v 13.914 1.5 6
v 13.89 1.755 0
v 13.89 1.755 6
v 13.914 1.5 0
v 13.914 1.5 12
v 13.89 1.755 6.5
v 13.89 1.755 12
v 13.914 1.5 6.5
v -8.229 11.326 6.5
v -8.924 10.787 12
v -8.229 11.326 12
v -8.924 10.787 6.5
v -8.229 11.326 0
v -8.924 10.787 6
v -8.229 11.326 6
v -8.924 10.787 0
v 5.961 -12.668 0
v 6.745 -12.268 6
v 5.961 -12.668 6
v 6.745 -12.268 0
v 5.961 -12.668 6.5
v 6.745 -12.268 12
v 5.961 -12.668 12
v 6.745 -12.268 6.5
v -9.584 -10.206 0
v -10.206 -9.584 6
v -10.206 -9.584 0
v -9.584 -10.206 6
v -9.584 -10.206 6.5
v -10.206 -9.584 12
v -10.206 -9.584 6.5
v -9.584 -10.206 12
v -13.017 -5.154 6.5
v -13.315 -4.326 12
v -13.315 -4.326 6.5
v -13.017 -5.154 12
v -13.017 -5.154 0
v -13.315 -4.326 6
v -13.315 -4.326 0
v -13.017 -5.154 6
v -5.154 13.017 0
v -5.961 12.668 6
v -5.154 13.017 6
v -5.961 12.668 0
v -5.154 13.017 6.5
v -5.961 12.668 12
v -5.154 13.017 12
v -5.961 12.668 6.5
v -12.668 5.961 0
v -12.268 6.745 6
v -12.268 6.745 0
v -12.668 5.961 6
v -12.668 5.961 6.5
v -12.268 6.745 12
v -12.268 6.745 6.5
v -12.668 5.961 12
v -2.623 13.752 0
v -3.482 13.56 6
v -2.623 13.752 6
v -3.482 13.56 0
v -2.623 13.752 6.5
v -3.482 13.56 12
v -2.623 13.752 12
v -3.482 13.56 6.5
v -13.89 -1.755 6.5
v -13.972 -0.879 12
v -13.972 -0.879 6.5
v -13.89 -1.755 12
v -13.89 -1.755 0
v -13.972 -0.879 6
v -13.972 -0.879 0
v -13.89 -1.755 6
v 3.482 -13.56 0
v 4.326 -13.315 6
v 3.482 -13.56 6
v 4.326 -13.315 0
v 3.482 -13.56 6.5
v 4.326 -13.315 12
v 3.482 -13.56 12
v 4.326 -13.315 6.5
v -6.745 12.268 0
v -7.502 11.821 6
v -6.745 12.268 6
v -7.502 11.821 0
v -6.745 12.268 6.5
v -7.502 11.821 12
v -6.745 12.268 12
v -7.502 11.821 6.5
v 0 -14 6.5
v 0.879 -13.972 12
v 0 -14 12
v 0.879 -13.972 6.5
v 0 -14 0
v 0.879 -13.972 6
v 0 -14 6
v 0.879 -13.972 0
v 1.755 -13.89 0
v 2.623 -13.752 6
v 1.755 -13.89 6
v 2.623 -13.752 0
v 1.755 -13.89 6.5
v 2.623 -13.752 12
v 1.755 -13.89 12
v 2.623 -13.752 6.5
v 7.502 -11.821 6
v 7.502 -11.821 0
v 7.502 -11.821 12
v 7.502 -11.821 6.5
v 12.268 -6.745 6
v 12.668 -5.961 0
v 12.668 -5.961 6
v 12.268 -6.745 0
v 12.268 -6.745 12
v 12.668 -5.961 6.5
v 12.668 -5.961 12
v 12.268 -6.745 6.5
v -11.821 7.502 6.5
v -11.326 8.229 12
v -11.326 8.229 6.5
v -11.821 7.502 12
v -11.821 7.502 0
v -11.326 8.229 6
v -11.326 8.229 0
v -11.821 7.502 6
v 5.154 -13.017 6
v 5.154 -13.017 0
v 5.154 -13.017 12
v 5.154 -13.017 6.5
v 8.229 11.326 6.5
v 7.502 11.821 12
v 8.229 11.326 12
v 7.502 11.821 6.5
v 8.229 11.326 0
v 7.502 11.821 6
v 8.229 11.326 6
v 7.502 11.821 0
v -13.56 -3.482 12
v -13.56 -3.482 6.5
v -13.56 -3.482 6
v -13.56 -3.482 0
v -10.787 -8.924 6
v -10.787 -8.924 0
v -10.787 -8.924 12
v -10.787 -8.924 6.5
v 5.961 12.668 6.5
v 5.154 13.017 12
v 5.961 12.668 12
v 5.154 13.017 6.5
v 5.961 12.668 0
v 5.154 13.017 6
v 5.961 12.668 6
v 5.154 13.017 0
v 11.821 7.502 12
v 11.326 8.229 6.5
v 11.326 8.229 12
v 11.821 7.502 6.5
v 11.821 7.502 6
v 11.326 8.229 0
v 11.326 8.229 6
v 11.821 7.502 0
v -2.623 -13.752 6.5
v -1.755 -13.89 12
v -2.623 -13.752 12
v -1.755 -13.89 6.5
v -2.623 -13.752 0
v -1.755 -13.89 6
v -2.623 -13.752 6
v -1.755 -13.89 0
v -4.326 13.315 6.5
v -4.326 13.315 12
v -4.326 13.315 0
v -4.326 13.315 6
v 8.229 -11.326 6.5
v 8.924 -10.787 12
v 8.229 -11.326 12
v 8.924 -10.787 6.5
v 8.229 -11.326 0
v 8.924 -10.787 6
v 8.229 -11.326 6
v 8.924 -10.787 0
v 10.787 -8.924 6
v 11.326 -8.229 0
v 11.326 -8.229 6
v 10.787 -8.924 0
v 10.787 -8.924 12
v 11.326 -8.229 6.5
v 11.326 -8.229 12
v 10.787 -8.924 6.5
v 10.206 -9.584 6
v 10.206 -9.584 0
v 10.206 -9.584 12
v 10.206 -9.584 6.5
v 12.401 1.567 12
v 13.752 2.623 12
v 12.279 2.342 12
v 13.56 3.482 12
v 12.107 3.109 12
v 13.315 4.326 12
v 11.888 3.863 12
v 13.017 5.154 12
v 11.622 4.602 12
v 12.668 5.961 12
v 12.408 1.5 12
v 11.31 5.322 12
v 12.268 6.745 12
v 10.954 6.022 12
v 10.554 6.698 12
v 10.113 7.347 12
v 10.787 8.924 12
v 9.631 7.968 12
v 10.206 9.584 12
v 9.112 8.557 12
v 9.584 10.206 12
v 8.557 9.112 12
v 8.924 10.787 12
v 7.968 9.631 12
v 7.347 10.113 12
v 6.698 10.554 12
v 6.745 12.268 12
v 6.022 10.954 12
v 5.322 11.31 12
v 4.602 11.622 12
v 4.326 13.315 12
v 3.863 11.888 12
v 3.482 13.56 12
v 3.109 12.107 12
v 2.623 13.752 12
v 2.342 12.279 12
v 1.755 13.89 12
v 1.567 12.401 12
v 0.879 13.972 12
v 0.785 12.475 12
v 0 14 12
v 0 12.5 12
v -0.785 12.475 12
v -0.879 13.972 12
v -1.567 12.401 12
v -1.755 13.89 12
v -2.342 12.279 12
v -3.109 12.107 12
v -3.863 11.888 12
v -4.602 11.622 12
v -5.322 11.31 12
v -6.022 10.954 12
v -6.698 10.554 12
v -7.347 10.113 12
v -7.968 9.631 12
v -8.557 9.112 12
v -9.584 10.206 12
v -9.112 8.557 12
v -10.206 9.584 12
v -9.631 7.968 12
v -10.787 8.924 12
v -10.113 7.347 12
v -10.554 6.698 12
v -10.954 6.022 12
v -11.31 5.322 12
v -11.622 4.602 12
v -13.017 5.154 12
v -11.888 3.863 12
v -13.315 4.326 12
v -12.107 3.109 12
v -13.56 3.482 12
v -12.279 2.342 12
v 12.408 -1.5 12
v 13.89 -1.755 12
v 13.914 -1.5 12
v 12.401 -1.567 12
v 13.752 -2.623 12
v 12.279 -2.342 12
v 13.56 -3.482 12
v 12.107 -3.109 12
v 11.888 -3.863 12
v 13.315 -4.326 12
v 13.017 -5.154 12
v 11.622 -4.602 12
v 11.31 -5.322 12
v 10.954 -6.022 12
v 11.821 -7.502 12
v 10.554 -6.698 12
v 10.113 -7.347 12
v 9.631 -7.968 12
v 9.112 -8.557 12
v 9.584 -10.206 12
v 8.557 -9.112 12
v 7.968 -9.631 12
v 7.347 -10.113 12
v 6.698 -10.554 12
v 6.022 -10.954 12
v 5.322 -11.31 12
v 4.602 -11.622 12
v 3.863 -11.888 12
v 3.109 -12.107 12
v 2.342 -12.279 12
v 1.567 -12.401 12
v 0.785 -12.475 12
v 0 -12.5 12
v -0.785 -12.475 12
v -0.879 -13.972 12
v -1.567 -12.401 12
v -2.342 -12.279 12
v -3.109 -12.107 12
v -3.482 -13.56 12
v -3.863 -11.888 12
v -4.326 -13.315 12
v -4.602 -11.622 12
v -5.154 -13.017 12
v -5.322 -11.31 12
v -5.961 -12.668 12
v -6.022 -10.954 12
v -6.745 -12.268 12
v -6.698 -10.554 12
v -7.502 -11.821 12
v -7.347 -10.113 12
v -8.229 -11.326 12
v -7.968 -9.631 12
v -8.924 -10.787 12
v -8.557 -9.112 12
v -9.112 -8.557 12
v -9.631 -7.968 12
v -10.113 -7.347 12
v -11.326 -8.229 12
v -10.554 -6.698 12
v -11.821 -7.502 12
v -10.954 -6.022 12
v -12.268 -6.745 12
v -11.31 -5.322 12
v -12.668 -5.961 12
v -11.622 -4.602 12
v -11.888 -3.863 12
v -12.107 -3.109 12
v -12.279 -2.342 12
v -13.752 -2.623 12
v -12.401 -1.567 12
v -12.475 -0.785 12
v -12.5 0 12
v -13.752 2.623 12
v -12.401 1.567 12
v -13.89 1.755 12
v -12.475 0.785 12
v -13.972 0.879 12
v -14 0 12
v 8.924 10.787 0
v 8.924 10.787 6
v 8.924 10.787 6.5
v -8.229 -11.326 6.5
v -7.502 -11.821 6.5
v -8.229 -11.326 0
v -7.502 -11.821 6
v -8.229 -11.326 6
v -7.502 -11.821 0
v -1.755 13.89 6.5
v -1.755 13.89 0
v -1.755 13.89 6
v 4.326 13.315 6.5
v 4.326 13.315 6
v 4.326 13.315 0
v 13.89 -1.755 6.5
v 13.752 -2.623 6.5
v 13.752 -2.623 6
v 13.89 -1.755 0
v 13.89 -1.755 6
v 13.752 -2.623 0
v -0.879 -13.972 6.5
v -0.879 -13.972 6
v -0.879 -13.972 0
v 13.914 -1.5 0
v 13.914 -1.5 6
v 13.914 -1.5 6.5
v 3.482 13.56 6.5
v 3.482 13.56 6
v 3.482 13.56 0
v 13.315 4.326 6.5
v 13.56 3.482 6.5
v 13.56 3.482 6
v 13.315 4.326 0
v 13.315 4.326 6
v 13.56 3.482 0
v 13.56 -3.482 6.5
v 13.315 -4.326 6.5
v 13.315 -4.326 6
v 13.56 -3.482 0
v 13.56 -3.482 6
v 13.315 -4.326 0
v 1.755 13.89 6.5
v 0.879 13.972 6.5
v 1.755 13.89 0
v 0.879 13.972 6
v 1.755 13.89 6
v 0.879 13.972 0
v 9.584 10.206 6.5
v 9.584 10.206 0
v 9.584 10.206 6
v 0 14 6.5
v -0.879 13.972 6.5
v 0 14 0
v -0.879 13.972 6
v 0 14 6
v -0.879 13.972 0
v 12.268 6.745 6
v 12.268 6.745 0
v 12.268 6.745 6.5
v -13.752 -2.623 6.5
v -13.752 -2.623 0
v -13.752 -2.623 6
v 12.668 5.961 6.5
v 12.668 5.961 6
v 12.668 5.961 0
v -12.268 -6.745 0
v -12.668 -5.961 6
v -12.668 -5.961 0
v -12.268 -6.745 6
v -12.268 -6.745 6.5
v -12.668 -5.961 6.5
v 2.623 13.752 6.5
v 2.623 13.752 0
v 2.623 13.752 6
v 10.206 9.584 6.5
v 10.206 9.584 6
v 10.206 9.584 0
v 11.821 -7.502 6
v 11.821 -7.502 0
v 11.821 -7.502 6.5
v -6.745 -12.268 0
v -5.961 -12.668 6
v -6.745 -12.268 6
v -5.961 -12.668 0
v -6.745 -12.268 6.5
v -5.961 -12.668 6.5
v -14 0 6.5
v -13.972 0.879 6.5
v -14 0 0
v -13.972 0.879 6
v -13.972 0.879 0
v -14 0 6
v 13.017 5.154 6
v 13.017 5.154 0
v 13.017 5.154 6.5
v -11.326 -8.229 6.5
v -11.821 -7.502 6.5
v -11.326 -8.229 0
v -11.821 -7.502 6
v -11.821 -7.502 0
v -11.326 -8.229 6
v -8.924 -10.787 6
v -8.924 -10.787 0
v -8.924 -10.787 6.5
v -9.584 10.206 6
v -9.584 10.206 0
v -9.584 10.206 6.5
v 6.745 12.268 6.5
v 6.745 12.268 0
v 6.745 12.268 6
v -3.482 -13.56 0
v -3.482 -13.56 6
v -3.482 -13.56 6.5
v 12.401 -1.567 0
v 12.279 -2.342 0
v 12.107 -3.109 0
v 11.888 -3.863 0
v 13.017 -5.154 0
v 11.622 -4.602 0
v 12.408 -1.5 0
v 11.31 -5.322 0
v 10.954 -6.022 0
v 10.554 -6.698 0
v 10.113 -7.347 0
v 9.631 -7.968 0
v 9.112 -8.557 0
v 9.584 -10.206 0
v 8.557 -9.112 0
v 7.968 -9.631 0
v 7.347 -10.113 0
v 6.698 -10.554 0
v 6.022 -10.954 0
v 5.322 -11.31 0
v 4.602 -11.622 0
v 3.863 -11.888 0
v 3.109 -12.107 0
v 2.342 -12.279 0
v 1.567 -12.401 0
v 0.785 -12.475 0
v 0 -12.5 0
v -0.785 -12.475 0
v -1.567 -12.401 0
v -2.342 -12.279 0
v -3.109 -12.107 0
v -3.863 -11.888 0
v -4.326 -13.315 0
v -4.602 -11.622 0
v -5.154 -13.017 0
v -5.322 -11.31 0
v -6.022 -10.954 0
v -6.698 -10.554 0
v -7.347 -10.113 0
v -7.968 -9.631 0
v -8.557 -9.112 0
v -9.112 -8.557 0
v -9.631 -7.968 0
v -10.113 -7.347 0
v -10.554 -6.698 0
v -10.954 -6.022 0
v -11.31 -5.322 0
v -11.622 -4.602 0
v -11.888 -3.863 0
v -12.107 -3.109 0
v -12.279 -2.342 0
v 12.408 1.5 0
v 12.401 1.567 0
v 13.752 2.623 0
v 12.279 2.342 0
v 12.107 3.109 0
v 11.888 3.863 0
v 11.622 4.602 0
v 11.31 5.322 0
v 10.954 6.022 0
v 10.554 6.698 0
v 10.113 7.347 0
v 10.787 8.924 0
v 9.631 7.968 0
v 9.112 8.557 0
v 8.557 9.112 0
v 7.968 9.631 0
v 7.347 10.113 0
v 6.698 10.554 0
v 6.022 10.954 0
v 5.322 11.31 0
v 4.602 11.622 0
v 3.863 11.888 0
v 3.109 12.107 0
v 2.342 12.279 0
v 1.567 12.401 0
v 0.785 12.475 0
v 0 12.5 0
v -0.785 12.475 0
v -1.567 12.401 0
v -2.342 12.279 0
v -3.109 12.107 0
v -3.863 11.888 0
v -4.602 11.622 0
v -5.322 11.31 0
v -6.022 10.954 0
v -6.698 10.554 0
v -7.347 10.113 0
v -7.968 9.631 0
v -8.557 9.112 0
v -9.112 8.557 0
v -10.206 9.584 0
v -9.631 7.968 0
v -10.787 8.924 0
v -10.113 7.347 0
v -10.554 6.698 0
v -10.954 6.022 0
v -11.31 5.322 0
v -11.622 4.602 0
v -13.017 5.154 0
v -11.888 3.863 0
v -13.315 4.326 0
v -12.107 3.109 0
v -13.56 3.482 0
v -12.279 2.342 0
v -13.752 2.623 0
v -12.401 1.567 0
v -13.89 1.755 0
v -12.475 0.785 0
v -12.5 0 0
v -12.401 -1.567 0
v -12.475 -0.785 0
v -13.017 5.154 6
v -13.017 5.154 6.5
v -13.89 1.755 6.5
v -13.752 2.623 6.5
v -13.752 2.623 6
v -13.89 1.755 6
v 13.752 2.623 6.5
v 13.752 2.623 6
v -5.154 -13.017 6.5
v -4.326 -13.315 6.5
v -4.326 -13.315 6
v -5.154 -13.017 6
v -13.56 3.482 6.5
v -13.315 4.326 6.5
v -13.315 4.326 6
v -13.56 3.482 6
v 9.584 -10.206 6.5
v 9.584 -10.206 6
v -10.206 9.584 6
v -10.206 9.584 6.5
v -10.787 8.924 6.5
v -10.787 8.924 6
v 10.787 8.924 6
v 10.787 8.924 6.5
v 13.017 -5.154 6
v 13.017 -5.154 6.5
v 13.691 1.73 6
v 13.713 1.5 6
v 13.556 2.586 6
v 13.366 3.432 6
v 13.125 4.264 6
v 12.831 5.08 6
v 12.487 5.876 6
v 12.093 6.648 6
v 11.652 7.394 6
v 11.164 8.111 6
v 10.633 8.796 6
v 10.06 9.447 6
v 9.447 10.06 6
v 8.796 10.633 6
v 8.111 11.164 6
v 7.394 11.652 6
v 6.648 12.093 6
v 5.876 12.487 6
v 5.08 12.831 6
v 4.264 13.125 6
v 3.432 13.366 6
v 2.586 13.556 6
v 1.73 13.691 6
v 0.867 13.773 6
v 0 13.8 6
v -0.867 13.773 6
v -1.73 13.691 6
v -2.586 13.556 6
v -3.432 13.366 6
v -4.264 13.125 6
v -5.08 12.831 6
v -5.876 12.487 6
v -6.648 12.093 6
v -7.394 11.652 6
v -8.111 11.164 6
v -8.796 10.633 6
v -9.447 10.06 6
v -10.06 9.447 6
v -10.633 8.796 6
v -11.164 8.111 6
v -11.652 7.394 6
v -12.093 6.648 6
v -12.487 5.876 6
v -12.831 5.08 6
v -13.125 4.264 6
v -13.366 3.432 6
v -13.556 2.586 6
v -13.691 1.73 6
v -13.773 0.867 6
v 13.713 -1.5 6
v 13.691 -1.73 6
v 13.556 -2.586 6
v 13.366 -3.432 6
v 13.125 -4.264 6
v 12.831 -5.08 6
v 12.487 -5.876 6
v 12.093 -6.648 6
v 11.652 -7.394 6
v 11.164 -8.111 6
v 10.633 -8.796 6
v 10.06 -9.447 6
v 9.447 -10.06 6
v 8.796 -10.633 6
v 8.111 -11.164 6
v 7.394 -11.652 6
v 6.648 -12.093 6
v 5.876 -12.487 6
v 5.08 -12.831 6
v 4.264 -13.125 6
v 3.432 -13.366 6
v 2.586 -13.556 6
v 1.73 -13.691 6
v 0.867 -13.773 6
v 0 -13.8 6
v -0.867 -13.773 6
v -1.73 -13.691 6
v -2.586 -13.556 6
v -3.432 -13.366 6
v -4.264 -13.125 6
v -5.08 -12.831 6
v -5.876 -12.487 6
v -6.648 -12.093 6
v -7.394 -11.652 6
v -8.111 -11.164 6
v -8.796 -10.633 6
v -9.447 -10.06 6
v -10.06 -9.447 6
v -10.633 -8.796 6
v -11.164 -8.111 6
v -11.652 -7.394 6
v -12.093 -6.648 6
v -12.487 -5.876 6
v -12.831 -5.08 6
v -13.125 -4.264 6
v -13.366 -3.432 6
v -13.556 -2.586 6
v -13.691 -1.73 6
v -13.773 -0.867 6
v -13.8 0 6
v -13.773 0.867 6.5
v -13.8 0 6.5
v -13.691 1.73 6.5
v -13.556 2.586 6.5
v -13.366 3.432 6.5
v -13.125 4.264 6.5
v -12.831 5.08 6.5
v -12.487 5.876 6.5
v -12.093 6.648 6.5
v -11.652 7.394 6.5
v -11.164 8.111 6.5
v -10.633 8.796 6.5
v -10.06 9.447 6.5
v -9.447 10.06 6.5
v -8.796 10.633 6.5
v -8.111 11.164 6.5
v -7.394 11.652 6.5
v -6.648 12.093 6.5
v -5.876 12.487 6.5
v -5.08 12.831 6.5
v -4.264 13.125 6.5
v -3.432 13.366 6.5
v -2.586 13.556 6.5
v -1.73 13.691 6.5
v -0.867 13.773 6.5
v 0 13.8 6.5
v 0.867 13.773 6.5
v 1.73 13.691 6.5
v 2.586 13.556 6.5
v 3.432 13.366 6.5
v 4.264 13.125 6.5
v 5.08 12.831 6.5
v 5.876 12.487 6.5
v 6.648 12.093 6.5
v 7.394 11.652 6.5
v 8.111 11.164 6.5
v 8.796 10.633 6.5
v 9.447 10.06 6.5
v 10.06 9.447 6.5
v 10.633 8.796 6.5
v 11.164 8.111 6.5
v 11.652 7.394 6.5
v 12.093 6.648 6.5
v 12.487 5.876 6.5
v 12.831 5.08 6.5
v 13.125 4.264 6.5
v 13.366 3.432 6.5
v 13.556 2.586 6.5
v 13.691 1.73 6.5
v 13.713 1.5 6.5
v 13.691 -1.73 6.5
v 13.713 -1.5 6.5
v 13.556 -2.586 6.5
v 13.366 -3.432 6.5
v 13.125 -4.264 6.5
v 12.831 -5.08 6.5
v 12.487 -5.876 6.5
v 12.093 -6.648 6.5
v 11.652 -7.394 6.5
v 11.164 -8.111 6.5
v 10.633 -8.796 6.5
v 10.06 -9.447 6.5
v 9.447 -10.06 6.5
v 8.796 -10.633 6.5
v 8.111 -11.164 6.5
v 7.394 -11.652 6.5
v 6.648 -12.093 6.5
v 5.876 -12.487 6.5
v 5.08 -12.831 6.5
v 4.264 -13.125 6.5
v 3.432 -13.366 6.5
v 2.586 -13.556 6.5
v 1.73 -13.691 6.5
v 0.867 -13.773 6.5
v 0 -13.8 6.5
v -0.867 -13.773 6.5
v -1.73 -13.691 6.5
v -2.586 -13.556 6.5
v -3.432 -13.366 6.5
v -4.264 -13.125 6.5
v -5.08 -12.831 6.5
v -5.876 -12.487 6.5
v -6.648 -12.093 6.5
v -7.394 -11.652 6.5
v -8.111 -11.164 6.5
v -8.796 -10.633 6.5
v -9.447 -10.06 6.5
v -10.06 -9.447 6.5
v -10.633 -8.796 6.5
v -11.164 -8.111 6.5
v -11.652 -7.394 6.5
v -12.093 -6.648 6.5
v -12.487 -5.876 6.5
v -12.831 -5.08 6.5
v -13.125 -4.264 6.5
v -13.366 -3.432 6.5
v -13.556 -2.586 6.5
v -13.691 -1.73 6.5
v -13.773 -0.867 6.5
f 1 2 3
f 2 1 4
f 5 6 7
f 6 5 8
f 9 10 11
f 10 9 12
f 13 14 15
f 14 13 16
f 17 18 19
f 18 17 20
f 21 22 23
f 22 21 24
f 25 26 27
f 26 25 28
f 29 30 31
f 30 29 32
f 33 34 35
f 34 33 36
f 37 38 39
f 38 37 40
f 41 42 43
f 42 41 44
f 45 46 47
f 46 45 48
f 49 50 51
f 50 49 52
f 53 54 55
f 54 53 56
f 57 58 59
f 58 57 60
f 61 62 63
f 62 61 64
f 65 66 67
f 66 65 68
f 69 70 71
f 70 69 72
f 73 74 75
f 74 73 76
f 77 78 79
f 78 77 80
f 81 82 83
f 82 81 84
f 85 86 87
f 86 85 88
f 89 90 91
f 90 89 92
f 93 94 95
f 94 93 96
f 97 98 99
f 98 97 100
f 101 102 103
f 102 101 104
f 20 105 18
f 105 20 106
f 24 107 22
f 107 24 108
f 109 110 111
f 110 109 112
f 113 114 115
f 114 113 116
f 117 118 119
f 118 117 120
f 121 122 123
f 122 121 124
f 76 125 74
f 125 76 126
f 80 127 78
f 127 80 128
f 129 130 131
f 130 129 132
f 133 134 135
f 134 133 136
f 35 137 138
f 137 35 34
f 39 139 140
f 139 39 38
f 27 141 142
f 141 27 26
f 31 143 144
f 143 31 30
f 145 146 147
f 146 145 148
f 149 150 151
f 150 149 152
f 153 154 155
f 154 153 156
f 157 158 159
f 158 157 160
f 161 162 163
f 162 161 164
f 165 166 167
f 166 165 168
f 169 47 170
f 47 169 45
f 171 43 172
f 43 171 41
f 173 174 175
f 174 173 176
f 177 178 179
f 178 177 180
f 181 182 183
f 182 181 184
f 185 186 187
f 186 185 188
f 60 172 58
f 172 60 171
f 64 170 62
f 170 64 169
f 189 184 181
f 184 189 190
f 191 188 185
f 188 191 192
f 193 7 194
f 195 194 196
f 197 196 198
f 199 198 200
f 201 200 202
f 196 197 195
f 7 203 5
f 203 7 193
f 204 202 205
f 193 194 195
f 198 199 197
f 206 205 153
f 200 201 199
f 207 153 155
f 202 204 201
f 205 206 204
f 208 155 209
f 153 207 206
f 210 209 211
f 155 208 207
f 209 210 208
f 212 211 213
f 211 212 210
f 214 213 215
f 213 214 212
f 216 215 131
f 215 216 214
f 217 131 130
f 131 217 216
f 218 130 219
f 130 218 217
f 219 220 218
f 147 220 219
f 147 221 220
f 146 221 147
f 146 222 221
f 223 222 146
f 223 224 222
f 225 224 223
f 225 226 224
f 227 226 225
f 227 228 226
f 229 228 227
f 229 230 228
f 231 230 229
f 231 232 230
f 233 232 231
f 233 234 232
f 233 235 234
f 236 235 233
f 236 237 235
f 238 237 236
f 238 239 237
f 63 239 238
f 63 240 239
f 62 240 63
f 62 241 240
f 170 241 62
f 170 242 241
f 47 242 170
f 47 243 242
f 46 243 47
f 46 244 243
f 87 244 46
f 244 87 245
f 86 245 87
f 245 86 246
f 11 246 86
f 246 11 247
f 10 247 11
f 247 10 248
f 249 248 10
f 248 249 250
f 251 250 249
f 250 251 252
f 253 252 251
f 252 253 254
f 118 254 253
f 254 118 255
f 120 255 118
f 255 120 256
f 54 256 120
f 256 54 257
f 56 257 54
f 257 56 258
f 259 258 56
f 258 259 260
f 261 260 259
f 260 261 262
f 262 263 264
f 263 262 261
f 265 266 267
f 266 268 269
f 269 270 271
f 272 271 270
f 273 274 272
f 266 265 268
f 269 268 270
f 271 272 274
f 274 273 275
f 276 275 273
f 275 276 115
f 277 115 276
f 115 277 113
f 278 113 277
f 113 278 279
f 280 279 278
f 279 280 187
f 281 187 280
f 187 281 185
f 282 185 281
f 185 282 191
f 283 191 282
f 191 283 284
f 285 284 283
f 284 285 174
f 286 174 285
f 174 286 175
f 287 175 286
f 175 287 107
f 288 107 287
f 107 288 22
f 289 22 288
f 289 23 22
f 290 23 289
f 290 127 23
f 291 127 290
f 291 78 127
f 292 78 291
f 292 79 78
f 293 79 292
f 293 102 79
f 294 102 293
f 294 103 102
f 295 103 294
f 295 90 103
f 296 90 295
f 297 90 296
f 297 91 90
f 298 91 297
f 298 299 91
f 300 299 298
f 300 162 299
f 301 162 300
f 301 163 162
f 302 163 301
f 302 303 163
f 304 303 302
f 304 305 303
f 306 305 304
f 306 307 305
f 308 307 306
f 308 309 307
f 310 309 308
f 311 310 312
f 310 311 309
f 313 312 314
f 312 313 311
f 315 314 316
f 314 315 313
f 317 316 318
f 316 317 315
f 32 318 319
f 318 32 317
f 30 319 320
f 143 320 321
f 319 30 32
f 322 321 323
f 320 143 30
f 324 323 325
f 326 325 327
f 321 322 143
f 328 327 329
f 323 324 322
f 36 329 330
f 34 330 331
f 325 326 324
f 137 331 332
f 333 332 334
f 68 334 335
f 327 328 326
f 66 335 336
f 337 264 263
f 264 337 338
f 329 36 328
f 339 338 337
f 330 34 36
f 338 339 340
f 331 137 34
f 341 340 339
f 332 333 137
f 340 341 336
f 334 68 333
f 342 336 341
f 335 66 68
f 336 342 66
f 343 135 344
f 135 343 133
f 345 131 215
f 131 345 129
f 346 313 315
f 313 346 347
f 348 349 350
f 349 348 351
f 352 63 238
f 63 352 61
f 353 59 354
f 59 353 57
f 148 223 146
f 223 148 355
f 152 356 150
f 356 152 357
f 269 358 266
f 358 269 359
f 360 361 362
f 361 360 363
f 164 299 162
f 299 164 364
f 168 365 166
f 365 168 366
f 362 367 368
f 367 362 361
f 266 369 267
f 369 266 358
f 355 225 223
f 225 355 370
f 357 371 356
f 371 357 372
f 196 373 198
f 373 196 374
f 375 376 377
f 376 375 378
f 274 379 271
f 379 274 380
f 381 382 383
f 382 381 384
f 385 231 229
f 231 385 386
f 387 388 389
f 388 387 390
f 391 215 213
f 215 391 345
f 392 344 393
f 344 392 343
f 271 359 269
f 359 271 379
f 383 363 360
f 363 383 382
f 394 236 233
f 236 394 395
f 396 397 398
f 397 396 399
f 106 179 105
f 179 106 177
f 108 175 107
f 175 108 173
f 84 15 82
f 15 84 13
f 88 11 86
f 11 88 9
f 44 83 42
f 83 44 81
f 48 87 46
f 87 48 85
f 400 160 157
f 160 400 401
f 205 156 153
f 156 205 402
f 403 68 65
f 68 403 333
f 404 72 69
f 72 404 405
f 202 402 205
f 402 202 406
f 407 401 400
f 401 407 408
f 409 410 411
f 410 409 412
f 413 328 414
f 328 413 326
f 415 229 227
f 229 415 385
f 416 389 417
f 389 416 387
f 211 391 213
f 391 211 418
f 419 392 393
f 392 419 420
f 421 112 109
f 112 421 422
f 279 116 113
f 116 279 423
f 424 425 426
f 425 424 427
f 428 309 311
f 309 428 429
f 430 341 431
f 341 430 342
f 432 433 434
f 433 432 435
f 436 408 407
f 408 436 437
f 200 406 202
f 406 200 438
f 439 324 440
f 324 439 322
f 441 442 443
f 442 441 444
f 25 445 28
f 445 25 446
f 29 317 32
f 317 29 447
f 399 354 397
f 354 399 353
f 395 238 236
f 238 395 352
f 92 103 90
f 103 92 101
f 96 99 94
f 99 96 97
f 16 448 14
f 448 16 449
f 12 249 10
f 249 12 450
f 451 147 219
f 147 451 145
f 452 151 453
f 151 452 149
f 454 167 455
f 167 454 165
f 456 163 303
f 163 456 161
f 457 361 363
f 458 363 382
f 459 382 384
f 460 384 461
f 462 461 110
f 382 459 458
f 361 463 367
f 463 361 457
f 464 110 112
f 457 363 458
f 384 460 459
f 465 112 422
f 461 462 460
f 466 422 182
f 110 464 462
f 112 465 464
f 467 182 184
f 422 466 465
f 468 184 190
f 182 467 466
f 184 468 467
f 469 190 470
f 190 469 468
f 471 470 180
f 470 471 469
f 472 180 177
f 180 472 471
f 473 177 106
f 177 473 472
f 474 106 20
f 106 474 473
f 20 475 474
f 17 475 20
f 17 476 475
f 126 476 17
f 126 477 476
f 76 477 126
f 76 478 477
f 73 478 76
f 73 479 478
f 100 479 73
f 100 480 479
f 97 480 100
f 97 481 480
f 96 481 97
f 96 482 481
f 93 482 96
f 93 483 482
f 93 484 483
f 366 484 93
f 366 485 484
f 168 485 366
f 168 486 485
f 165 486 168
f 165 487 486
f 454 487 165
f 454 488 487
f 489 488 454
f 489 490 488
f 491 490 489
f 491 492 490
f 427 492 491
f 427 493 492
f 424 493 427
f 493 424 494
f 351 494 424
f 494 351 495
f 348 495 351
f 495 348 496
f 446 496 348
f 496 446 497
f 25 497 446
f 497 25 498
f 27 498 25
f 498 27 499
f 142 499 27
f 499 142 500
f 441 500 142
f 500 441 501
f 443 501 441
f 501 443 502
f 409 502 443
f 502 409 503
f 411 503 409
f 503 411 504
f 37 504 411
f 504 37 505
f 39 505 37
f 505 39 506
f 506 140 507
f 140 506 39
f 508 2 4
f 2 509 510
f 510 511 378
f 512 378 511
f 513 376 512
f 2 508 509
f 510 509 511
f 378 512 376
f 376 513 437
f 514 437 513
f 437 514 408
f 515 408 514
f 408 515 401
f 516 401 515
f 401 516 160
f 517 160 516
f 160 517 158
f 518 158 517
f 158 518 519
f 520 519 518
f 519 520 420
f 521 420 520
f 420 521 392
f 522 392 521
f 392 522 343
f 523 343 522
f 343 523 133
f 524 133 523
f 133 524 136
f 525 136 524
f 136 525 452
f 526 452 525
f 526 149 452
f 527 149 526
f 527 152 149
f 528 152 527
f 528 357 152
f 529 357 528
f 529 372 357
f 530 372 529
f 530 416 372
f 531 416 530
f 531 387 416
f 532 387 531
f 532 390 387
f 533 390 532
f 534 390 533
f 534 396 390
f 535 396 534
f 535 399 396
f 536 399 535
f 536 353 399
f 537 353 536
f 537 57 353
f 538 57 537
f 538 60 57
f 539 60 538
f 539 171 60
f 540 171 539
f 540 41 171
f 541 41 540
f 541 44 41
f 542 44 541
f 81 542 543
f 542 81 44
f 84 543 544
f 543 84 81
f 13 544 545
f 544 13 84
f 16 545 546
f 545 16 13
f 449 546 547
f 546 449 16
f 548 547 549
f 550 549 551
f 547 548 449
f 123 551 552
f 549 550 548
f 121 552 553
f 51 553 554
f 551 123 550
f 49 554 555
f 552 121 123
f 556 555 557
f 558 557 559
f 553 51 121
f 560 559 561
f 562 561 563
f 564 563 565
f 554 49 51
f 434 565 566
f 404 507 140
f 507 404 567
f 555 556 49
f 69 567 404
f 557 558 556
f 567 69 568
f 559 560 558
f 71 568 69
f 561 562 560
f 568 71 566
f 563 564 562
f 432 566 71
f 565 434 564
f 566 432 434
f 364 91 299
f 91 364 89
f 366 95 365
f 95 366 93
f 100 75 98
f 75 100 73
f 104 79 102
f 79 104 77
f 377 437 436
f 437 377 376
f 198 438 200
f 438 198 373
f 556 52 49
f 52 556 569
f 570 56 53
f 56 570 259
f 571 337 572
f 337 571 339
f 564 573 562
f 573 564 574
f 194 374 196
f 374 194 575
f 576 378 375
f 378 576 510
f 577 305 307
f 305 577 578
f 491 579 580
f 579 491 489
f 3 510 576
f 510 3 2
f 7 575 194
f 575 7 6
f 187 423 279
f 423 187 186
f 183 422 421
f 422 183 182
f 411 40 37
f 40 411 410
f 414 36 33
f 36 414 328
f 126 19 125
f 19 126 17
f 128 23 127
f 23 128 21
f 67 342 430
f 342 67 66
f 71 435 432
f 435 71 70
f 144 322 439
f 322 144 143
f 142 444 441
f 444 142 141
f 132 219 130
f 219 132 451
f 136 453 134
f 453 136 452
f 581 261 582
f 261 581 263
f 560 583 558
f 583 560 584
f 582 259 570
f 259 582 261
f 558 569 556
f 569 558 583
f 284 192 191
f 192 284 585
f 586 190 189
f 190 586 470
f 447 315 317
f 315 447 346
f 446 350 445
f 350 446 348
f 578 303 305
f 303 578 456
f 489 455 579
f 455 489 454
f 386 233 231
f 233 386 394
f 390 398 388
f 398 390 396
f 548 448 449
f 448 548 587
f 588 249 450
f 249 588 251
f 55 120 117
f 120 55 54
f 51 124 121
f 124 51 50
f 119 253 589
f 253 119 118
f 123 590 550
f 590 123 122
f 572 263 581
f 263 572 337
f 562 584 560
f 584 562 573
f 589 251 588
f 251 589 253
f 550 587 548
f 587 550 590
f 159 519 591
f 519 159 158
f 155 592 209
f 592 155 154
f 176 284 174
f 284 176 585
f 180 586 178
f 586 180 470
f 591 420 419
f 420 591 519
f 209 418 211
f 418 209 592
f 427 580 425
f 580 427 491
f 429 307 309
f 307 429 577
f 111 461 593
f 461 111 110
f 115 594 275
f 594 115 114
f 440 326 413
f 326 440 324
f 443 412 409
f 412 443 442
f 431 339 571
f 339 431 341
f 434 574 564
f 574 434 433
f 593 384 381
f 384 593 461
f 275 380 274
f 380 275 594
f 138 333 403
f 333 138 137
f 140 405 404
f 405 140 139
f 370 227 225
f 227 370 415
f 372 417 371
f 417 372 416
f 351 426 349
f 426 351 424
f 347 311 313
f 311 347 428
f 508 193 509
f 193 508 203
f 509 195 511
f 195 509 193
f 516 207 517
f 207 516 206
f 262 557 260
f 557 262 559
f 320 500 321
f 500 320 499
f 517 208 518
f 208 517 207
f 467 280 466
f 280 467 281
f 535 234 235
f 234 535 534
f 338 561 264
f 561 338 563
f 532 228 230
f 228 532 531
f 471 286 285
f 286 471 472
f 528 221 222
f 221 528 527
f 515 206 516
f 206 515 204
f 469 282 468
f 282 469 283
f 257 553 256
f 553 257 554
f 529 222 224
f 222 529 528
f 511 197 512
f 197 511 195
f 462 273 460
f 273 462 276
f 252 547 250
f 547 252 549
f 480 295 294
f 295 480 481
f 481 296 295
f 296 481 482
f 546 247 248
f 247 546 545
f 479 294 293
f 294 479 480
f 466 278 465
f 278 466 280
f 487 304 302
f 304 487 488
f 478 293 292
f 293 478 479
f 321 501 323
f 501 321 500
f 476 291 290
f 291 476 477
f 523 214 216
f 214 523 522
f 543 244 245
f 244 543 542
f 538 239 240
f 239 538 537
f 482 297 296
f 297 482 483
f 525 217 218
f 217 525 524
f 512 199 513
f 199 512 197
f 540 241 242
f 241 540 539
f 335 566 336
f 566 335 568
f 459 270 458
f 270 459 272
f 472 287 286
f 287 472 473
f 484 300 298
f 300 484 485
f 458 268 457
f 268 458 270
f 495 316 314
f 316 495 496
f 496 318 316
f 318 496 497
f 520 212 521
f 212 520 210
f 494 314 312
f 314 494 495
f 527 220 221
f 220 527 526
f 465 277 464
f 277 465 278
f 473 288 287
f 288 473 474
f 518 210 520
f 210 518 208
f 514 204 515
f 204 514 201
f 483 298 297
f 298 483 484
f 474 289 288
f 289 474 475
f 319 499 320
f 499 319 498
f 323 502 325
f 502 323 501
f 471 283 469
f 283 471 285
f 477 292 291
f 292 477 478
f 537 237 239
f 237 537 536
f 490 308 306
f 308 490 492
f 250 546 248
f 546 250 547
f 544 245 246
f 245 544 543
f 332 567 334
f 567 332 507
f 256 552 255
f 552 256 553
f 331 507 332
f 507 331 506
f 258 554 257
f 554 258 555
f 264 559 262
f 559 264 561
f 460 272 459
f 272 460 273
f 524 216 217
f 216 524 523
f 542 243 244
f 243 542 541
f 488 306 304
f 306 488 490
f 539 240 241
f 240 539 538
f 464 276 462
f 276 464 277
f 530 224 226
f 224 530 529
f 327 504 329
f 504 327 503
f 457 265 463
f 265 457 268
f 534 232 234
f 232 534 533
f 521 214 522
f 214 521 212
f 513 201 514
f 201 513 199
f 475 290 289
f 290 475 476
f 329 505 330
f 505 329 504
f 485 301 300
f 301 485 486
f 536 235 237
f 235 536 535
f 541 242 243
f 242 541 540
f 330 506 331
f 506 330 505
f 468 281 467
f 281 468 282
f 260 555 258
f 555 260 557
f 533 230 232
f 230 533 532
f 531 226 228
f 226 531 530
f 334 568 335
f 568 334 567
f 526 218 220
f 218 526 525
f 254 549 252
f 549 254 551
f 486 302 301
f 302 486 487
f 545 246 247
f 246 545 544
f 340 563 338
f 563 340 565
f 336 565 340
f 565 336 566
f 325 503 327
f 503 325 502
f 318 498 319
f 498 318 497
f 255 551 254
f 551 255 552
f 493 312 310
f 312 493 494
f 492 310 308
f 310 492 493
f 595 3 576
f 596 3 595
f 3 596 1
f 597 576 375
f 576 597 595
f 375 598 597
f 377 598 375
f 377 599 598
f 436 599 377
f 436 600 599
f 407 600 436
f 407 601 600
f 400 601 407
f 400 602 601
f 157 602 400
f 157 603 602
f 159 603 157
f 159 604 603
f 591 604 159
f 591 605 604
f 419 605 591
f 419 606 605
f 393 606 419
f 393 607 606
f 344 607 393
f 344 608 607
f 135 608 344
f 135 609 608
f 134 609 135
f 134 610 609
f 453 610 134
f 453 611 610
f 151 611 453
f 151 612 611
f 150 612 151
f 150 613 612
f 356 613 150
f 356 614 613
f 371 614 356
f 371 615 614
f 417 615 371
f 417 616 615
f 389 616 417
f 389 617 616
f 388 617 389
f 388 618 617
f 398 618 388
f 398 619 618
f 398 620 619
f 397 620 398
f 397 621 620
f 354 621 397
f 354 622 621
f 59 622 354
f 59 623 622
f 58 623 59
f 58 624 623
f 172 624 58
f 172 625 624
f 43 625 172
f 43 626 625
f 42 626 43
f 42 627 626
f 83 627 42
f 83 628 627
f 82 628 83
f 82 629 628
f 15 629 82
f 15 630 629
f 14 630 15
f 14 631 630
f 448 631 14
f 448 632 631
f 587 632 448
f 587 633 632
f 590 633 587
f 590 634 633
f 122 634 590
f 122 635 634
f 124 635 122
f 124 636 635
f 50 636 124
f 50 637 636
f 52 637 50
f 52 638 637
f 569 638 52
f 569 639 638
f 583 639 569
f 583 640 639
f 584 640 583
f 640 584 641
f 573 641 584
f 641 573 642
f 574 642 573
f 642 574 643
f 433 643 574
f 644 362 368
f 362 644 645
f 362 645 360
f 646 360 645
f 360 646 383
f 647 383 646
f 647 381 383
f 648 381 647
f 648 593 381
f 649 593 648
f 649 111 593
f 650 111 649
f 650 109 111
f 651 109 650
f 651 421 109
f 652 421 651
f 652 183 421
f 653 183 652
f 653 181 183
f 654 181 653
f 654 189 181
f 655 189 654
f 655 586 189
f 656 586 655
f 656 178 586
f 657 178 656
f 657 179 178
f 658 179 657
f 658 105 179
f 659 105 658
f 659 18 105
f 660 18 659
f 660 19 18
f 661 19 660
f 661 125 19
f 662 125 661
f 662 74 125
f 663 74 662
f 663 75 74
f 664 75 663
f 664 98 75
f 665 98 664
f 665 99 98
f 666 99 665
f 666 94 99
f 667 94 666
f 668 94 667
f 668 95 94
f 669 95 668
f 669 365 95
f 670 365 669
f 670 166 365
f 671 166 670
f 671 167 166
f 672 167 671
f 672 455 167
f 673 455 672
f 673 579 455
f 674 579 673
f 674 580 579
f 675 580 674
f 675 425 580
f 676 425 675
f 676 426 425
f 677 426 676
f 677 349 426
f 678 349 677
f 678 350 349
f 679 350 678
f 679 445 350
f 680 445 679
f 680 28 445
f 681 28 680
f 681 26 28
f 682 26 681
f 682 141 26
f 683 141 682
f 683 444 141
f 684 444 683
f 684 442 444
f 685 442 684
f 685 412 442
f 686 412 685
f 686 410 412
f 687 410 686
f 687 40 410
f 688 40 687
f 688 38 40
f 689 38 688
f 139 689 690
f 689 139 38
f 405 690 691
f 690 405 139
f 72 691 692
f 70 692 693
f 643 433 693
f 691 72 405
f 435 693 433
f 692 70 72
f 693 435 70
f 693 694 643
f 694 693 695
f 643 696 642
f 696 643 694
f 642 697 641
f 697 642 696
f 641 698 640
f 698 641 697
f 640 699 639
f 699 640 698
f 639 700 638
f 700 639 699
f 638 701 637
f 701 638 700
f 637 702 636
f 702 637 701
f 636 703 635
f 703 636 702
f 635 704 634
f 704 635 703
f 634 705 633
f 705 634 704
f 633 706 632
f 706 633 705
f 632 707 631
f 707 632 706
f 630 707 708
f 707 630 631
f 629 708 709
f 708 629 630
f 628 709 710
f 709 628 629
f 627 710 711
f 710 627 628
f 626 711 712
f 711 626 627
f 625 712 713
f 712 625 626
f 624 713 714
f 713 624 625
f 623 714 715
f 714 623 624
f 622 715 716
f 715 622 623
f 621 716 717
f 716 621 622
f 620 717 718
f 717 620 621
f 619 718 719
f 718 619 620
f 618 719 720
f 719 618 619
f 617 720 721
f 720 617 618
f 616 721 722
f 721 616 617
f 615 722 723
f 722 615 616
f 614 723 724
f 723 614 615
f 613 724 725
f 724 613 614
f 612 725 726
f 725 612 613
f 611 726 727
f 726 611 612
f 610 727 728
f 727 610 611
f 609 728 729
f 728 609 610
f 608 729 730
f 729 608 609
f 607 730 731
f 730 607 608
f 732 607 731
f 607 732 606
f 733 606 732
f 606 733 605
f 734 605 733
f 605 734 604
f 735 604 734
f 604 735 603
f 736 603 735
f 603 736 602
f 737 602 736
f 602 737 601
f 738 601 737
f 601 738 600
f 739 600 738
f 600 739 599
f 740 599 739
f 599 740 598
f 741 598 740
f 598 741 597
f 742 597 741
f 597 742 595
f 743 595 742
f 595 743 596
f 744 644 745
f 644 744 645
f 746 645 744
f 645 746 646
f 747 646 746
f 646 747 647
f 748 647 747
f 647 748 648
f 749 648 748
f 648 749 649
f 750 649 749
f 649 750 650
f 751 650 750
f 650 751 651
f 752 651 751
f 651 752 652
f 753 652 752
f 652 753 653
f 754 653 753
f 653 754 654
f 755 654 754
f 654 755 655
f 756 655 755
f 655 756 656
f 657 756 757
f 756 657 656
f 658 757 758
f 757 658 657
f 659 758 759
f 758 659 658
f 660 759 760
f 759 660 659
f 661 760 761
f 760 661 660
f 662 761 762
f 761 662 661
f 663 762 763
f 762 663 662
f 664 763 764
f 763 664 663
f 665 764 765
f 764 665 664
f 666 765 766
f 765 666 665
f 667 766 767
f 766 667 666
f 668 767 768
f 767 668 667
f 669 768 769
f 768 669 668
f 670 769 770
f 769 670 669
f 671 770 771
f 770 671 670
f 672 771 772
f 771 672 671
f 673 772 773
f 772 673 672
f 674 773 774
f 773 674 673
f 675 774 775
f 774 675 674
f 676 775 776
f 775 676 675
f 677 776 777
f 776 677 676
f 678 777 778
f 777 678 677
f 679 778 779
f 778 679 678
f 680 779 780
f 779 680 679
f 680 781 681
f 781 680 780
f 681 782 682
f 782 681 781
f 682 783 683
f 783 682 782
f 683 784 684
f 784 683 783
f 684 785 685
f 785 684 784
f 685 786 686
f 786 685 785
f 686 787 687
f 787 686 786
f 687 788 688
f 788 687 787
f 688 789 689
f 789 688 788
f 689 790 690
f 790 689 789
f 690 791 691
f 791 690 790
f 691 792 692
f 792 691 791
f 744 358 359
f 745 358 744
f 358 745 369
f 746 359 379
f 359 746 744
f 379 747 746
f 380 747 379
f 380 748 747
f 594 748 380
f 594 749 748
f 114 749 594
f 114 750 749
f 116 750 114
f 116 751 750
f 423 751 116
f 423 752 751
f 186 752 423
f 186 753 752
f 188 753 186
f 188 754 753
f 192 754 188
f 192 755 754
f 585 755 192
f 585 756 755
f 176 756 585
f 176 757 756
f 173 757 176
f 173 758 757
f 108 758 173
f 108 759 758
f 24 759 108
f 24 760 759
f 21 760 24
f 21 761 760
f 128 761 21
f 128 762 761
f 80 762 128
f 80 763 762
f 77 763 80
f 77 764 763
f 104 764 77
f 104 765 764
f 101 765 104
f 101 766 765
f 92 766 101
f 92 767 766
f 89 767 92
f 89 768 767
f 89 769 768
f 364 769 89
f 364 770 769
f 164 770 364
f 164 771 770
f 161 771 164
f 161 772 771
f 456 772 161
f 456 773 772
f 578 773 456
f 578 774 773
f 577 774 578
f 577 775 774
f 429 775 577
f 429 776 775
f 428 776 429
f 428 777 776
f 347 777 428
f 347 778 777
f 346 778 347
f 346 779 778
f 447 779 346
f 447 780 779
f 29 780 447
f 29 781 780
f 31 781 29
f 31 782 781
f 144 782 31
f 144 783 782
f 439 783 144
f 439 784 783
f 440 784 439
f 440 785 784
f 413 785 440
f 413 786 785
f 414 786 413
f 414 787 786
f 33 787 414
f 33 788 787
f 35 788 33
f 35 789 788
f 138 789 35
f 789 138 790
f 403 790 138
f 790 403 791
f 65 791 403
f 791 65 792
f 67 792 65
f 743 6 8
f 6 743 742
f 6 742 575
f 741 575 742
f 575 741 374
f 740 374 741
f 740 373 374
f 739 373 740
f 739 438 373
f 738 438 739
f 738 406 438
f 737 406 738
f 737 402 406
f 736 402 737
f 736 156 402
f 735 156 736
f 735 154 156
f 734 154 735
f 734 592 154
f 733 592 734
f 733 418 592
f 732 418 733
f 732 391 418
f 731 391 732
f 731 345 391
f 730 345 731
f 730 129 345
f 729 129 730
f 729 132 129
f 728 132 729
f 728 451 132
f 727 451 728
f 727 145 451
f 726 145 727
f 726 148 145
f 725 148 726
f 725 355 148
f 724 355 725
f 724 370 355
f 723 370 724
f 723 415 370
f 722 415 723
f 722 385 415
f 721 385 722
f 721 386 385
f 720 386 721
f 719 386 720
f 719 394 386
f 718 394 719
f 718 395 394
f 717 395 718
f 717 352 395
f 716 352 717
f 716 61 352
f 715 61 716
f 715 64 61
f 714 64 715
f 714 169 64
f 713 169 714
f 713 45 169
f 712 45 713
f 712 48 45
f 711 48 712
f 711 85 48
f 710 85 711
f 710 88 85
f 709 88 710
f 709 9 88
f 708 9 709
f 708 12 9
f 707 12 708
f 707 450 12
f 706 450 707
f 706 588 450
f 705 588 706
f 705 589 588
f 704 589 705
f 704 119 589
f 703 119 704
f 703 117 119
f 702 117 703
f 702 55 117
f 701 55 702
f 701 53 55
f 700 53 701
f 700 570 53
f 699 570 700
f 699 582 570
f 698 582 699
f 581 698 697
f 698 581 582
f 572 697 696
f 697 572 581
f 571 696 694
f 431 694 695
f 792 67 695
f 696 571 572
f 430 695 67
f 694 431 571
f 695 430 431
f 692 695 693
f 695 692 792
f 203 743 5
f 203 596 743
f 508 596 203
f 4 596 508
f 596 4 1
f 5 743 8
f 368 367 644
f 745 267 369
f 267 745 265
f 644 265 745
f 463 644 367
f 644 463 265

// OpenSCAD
/*
 * HIRT ERT Ring Mounting Collar
 * 
 * Insulating collar for mounting ERT (Electrical Resistivity) rings
 * 
 * Specifications:
 * - Inner Diameter: 25mm (matches rod OD)
 * - Width: 12mm
 * - Material: PETG or ABS (non-conductive)
 * 
 * Features:
 * - Insulating collar for ERT ring
 * - Groove for ring mounting
 * - Wire routing channel
 */

// Parameters
collar_id = 25;              // Inner diameter (matches rod OD)
collar_od = 28;             // Outer diameter (mm)
collar_width = 12;           // Width of collar (mm)
ring_groove_width = 0.5;    // Groove for ring (mm)
ring_groove_depth = 0.2;    // Groove depth (mm)
wire_channel_width = 3;     // Wire routing channel width (mm)
wire_channel_depth = 2;     // Wire channel depth (mm)

// Main collar
module collar() {
    difference() {
        // Outer cylinder
        cylinder(h = collar_width, d = collar_od, $fn = 100);
        
        // Inner hole (fits over rod)
        translate([0, 0, -0.5])
            cylinder(h = collar_width + 1, d = collar_id, $fn = 100);
        
        // Ring groove (for ring to sit in)
        translate([0, 0, collar_width/2])
            rotate_extrude($fn = 100)
                translate([collar_od/2 - ring_groove_depth, 0, 0])
                    square([ring_groove_depth, ring_groove_width]);
        
        // Wire routing channel (slot for wire)
        translate([collar_od/2 - wire_channel_depth, -wire_channel_width/2, -0.5])
            cube([wire_channel_depth + 1, wire_channel_width, collar_width + 1]);
    }
}

// Export
collar();

// For visualization with ring (uncomment to see):
// module collar_with_ring() {
//     collar();
//     // ERT ring (for visualization only)
//     color("silver") {
//         translate([0, 0, collar_width/2])
//             rotate_extrude($fn = 100)
//                 translate([collar_od/2, 0, 0])
//                     square([0.5, 12]);
//     }
// }
// collar_with_ring();
